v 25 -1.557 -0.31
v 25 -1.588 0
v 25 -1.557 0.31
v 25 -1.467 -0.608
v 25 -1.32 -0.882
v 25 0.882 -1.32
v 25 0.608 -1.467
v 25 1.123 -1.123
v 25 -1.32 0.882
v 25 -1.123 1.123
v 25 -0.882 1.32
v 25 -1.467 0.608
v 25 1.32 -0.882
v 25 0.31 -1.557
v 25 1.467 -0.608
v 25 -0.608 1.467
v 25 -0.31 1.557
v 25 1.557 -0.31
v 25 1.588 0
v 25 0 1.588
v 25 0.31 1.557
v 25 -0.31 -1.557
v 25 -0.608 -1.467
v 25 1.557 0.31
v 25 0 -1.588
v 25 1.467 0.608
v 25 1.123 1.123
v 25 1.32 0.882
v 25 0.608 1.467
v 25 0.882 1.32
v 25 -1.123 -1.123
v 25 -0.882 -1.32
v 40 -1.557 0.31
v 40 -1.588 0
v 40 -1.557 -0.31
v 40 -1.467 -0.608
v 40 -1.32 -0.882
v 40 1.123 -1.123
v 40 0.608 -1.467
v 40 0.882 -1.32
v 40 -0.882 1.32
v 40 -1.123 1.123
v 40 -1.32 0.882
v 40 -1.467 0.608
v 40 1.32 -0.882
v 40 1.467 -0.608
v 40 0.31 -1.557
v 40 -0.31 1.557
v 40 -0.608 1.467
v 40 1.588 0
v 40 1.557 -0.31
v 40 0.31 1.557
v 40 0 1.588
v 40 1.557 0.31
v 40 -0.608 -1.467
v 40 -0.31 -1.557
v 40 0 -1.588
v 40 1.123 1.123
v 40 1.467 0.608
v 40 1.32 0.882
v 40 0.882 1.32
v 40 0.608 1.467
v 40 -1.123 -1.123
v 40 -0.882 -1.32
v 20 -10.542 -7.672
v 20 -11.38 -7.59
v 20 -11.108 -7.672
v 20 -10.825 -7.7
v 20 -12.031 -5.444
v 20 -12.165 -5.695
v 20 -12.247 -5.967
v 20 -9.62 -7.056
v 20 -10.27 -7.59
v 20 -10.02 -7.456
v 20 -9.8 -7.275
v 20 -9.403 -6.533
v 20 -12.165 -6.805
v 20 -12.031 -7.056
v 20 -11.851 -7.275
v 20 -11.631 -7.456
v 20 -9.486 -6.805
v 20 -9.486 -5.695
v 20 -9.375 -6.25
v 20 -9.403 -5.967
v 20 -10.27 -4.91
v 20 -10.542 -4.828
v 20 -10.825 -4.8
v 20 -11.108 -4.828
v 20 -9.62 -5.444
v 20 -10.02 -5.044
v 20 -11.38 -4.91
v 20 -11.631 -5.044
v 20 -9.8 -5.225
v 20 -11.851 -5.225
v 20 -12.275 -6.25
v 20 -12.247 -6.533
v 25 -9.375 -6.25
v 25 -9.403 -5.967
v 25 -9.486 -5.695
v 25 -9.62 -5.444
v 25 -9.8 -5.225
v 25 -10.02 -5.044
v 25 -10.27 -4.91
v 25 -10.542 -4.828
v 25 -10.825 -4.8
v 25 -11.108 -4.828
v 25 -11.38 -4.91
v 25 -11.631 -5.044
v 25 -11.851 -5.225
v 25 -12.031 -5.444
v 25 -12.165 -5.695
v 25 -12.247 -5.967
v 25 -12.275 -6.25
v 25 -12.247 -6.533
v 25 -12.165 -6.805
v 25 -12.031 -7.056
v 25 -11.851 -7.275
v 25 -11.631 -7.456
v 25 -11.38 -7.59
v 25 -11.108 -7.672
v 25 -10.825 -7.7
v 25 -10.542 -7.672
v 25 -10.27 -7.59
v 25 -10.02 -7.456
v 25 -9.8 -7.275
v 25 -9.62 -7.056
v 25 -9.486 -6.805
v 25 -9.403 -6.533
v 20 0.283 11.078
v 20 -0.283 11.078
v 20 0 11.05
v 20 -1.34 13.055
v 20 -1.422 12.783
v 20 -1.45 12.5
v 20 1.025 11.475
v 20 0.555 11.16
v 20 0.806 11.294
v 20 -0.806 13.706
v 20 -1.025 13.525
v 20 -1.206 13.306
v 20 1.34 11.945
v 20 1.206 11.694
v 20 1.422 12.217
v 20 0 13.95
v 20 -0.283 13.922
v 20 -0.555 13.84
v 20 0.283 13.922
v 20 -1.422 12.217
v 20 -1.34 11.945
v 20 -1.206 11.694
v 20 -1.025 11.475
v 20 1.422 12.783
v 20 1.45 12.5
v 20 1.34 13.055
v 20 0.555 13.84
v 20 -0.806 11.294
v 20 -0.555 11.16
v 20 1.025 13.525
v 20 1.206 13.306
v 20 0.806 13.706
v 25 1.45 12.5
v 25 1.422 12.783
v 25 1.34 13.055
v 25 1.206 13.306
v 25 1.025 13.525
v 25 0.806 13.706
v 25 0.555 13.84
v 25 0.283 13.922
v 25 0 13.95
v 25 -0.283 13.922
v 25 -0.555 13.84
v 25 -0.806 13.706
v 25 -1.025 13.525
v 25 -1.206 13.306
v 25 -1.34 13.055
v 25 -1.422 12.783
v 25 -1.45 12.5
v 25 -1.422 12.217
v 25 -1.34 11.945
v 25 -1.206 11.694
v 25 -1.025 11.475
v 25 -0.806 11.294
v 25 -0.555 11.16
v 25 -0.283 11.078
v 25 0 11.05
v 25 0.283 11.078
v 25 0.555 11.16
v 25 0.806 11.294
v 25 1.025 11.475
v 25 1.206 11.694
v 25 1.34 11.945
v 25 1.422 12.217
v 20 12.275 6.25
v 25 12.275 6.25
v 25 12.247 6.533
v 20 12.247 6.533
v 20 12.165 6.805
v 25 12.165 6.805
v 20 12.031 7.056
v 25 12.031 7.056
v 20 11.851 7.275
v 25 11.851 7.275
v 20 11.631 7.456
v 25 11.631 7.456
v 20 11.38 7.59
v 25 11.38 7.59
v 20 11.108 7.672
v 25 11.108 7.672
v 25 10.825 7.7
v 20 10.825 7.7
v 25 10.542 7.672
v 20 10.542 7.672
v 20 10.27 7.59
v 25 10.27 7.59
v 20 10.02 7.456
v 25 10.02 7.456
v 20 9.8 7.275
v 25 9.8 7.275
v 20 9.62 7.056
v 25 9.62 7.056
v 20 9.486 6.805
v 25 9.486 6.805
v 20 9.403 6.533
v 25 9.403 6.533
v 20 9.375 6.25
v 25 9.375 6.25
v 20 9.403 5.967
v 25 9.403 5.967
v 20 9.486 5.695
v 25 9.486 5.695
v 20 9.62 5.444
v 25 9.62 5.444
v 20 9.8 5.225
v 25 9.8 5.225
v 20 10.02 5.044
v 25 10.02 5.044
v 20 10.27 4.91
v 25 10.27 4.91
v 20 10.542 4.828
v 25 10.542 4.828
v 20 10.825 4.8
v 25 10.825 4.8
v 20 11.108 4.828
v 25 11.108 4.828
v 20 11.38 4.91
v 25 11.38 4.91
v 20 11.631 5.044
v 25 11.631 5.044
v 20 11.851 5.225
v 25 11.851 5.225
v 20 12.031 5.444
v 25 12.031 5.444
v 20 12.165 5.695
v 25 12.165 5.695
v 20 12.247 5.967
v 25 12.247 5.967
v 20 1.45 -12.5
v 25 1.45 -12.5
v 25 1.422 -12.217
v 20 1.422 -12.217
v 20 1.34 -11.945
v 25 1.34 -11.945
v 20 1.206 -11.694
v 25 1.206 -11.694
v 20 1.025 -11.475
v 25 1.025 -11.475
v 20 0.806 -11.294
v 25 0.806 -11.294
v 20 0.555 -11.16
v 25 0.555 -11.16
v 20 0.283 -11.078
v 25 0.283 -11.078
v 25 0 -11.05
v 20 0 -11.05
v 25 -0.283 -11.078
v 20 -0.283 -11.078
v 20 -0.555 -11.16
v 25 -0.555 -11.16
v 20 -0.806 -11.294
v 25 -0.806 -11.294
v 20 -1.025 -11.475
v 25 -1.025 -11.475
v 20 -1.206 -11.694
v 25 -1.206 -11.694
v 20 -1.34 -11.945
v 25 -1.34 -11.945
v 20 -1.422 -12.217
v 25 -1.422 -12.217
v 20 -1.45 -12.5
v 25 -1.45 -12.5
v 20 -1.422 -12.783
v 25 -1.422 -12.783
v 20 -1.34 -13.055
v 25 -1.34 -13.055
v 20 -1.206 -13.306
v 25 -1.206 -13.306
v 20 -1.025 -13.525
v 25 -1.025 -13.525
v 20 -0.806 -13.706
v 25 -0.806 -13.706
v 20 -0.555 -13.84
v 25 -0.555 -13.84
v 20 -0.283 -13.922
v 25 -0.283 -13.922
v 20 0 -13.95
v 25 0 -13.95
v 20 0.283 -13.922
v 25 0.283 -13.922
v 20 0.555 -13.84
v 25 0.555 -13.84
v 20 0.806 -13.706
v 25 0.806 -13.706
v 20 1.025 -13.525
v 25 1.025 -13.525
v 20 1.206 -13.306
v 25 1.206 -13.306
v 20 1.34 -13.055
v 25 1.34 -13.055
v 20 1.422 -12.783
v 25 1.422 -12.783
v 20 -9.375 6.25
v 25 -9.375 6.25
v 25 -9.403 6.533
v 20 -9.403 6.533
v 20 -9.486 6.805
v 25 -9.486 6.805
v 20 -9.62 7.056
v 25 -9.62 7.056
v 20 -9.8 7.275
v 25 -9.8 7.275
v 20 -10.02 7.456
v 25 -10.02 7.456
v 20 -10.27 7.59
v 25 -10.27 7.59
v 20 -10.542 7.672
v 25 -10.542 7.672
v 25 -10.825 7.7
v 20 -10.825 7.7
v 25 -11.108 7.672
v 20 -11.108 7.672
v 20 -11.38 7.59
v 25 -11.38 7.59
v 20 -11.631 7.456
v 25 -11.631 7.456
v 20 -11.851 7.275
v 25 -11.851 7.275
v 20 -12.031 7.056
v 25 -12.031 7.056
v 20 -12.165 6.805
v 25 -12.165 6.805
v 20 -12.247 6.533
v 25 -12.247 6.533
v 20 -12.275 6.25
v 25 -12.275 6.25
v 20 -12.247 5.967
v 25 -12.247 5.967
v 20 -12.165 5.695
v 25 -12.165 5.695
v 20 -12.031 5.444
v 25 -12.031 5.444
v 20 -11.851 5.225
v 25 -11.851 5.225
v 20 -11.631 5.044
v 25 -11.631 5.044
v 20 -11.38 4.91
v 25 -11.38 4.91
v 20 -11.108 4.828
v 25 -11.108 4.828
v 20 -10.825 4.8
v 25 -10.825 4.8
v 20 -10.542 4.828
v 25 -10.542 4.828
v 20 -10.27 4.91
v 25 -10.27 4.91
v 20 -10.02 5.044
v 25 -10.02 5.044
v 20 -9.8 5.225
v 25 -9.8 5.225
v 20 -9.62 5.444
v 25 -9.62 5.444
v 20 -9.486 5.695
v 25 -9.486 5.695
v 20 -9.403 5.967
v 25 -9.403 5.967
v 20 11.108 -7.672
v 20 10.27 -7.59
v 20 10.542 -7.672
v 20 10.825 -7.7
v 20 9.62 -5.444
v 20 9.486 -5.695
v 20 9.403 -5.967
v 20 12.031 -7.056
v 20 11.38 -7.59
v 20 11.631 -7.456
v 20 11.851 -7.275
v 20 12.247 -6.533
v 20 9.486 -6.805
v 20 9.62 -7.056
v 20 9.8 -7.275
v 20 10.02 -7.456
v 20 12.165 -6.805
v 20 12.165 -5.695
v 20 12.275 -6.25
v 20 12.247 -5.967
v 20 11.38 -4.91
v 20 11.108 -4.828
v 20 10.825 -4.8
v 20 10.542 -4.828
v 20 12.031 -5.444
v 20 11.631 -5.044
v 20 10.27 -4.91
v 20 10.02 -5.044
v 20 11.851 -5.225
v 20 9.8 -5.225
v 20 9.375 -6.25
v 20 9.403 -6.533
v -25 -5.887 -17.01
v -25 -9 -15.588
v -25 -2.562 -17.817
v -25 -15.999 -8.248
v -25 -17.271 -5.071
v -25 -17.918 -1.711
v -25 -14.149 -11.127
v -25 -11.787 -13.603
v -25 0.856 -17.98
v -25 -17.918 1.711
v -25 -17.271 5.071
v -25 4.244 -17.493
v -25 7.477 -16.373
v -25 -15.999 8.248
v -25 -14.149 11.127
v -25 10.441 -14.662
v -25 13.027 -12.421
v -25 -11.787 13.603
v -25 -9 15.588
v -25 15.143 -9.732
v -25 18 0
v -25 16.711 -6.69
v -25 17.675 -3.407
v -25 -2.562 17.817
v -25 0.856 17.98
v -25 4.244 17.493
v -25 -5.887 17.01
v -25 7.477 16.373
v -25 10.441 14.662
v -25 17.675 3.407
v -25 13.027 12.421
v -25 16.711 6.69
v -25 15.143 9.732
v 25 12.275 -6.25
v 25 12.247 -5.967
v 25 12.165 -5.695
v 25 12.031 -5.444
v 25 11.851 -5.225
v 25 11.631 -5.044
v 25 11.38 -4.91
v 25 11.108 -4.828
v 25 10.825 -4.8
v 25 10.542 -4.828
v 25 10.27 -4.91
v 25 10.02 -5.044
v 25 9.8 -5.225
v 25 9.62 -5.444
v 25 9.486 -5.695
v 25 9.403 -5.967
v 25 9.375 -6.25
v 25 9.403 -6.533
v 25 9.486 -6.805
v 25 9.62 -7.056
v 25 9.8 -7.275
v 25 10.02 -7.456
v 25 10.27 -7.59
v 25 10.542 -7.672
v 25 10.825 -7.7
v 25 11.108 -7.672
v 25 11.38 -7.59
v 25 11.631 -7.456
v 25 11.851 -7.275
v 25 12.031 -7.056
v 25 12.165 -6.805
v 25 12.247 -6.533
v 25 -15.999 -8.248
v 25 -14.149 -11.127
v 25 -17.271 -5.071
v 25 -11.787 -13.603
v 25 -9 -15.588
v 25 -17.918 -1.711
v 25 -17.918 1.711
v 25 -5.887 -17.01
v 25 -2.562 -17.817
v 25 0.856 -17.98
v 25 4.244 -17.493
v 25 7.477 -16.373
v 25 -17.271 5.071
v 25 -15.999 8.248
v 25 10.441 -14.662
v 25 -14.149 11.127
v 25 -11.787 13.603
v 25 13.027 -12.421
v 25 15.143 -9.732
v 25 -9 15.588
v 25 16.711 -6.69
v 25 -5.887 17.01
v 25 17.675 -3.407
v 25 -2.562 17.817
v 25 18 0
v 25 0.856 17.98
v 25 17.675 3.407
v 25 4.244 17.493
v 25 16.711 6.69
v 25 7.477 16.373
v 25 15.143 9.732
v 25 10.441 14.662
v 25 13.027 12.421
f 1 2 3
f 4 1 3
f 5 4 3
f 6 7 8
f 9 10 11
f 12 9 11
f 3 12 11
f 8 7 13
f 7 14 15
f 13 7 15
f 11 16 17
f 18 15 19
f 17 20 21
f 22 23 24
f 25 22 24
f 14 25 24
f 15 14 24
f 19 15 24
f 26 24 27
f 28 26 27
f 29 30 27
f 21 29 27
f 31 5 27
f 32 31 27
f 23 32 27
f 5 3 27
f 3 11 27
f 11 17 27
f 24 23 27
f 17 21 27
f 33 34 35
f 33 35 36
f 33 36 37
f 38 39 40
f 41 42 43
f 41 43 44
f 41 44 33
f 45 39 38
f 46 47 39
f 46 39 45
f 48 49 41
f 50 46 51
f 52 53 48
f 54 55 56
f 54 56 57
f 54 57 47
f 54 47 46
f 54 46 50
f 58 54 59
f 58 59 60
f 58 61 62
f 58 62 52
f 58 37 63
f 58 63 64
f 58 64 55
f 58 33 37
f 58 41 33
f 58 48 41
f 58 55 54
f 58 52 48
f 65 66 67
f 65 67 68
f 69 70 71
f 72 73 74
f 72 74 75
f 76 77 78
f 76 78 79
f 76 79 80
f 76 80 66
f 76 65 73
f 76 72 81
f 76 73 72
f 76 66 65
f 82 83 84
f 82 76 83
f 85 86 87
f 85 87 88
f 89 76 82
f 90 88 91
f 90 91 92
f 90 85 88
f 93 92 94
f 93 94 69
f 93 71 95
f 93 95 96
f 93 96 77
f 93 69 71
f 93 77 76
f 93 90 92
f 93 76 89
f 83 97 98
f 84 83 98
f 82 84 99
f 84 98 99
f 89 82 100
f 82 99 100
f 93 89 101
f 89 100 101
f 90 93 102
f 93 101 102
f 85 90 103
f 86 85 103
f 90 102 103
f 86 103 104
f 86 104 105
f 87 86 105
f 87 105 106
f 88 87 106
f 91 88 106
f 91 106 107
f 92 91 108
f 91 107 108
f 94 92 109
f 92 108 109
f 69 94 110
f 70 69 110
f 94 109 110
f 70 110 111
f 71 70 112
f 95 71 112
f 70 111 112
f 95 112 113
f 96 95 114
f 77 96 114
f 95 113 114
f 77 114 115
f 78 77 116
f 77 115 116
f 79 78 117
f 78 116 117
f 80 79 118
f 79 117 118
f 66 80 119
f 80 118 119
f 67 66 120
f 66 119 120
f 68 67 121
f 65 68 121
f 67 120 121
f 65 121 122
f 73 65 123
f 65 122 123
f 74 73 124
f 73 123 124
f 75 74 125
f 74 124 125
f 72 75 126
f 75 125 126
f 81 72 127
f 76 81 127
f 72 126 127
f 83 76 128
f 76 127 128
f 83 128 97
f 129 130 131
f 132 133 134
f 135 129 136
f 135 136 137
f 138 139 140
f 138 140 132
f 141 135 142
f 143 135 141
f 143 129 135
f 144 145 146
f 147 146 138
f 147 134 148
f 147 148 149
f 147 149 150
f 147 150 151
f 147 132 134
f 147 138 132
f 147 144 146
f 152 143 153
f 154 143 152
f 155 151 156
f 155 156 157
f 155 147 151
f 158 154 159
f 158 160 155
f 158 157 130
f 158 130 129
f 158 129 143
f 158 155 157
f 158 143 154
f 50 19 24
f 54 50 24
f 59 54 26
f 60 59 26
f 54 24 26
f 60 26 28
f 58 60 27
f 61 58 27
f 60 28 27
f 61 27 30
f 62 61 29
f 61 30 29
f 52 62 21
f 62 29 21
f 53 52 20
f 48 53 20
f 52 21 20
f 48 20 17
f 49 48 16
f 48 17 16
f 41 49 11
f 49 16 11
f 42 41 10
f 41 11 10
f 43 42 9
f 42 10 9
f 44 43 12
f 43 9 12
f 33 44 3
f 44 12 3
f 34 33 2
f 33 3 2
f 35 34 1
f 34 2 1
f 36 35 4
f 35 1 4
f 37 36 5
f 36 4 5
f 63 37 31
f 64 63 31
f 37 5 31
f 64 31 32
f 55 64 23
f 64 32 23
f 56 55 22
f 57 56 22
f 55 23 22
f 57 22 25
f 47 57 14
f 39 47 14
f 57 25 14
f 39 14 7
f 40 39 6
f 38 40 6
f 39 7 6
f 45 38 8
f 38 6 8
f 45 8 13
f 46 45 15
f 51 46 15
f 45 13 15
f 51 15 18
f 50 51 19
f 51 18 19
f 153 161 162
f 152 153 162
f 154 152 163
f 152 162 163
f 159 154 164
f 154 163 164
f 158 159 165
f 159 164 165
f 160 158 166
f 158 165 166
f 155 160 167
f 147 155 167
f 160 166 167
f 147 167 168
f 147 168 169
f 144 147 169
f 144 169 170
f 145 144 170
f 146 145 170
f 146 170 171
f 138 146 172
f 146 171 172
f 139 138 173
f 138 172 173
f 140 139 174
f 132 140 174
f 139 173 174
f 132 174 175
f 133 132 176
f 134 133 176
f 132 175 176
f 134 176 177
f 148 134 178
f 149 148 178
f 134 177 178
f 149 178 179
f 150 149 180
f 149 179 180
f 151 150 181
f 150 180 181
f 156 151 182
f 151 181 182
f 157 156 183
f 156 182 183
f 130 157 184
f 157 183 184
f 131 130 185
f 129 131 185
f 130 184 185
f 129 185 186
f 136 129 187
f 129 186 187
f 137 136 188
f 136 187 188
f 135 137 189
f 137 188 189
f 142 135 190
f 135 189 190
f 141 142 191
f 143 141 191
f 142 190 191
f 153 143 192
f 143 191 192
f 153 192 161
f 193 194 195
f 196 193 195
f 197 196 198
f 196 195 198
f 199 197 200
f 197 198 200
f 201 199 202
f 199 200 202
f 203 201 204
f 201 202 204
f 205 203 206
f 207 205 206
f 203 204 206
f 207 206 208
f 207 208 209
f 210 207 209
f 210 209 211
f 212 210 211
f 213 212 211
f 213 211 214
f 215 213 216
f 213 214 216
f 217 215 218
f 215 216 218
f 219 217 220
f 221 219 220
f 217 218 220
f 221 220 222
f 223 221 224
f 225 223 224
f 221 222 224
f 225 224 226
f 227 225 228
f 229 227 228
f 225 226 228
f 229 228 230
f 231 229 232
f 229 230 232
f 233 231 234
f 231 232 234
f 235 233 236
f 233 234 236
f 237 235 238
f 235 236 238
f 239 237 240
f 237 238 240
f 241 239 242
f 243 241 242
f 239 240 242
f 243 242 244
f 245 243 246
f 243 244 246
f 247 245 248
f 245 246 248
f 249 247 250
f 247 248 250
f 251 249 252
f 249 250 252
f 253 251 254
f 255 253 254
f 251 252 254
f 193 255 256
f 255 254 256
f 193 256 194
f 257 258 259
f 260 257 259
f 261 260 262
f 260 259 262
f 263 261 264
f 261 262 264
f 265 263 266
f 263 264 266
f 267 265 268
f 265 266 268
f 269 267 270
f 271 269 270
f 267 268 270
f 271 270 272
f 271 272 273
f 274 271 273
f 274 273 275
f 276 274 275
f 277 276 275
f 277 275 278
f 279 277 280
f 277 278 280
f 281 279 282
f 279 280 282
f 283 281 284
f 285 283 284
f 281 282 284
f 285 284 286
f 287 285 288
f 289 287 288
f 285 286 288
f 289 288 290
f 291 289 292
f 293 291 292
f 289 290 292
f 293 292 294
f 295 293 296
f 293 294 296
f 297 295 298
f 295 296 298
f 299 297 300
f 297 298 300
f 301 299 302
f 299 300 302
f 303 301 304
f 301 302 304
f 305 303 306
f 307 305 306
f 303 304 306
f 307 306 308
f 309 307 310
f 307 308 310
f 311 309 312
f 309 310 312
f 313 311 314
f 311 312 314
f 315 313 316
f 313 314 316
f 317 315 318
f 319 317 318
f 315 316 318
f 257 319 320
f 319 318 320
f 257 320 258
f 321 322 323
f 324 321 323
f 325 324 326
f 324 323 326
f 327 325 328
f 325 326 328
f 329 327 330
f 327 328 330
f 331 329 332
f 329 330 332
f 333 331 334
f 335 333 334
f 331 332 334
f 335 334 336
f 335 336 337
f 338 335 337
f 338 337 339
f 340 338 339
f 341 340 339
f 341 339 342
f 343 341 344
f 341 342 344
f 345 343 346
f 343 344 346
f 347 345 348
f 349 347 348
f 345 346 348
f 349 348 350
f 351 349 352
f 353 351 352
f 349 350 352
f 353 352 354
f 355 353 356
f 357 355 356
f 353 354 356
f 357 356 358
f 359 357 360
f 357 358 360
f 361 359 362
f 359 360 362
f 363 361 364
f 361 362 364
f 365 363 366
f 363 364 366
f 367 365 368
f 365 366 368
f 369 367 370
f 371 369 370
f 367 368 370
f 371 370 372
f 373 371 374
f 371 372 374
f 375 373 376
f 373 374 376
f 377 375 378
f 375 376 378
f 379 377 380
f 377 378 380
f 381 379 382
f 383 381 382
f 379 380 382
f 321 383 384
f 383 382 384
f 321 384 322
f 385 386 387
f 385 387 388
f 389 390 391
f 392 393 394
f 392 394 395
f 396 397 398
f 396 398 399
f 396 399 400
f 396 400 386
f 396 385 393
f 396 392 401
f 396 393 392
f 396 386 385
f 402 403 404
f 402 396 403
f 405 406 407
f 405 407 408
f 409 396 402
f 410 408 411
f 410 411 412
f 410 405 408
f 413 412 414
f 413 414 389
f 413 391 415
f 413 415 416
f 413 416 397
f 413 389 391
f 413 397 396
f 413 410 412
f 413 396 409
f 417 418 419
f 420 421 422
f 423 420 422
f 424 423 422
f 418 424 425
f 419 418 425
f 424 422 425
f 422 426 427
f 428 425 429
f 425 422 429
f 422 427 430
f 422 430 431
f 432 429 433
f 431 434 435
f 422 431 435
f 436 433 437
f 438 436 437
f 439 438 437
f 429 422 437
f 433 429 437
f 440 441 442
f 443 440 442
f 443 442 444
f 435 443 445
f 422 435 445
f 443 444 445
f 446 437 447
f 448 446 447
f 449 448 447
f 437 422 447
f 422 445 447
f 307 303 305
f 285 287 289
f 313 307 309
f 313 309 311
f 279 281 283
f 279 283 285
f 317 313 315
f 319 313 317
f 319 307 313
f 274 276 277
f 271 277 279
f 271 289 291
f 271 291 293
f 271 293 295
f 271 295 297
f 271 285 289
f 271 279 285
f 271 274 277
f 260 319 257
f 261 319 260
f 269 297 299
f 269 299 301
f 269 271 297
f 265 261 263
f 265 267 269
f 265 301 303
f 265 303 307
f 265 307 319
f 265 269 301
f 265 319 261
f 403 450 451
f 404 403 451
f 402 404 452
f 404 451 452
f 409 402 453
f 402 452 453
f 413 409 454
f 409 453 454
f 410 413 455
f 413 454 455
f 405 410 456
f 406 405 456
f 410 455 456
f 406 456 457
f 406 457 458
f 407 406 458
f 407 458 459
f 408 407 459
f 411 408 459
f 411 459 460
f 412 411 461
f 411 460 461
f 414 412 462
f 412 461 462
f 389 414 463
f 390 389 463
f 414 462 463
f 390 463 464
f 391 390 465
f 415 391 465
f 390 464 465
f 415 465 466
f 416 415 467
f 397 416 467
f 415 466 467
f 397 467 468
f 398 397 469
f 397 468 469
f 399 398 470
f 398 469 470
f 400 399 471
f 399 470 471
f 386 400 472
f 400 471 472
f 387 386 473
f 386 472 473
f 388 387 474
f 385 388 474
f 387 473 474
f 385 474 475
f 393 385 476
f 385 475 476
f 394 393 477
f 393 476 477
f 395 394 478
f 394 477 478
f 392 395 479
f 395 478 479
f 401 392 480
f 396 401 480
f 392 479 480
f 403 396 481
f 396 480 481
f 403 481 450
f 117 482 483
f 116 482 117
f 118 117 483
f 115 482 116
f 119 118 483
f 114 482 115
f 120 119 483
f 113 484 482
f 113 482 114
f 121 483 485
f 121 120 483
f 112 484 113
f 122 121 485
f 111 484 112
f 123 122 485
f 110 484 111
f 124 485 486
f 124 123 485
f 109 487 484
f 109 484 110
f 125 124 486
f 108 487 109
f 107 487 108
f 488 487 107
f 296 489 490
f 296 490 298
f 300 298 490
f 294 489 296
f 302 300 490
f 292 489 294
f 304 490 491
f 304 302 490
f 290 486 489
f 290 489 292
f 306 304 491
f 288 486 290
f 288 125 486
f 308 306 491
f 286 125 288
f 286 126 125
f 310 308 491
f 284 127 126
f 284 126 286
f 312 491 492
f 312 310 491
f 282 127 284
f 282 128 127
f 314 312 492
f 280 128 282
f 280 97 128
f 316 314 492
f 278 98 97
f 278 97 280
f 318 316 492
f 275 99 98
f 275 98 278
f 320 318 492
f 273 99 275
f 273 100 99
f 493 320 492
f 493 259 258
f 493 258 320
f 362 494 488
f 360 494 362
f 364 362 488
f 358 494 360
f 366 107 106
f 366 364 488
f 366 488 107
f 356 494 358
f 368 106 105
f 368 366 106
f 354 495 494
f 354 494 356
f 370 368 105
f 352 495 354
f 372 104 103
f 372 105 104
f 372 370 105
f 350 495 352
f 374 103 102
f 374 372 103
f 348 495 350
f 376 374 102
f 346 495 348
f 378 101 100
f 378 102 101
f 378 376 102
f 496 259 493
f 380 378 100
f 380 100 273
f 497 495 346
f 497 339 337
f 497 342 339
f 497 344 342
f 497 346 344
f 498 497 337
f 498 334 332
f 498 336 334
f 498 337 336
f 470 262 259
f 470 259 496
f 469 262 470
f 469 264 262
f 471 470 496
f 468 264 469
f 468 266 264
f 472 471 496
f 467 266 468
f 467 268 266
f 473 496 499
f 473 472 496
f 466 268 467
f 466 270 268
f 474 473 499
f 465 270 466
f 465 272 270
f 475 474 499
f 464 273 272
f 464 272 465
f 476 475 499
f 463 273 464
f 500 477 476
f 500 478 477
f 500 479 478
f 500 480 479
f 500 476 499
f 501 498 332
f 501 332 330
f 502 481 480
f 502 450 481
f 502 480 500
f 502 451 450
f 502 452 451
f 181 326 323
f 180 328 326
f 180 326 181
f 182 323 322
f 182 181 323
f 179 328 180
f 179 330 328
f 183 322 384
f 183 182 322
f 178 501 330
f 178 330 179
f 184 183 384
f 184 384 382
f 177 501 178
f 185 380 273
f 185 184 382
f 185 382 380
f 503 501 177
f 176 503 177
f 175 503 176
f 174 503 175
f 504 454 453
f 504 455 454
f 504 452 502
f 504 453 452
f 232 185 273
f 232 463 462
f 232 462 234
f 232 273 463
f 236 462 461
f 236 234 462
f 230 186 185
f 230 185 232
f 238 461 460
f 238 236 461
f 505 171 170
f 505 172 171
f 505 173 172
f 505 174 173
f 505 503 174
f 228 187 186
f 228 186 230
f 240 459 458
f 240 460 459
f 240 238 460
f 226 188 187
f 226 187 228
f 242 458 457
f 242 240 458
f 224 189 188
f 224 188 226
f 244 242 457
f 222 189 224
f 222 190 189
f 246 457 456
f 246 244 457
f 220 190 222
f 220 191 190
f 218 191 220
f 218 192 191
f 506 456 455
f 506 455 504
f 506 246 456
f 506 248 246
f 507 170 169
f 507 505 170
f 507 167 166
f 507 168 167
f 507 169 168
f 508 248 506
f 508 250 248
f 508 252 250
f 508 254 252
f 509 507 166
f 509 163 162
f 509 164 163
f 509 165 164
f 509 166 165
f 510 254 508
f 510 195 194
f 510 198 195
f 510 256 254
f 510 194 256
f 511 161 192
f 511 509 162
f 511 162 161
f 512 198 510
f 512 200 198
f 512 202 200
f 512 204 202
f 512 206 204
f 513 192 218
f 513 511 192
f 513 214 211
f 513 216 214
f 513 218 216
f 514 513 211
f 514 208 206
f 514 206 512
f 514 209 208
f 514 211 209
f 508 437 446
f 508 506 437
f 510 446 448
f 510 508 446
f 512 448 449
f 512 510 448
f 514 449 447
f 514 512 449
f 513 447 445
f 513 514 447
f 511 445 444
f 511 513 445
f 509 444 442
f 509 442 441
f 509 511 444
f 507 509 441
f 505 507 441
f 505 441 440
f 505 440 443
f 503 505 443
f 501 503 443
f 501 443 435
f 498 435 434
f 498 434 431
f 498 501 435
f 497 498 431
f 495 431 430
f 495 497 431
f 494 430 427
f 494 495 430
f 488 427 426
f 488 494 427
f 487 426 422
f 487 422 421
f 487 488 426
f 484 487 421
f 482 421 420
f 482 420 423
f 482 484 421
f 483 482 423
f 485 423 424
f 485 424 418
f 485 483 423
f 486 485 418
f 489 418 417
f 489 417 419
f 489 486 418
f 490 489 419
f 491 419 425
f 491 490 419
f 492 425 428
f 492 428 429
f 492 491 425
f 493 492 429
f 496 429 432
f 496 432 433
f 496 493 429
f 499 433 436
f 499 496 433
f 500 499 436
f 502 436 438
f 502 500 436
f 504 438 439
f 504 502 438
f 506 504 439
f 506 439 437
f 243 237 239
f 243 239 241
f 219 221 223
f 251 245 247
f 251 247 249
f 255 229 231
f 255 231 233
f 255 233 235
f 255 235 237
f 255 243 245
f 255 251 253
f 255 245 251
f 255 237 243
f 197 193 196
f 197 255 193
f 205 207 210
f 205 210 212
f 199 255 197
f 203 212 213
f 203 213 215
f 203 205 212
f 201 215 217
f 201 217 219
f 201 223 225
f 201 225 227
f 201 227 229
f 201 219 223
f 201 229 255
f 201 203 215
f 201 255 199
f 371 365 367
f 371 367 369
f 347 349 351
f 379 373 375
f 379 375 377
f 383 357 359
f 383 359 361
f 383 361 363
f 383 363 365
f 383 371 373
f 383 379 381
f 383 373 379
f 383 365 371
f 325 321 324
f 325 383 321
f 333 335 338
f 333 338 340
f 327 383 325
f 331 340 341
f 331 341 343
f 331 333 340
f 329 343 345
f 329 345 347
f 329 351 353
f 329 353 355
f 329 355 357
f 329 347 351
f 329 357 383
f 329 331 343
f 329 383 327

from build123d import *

# Parameters (mm, degrees)
F0_R     = 18
F1_DEPTH = 25
F2_R     = 1.5875
F3_DEPTH = 15
F4_R     = 1.45
F5_DEPTH = 5


with BuildPart() as f1:
    # F0 (on Right) → F1 (new body, symmetric)
    with BuildSketch(Plane.YZ):
        Circle(F0_R)
    extrude(amount=F1_DEPTH, both=True)

    # F4 (on face) → F5 (cut)
    with BuildSketch(Plane.YZ.offset(25)):
        with Locations((-10.8253175473, 6.25)):
            Circle(F4_R)
        with Locations((0, 12.5)):
            Circle(F4_R)
        with Locations((10.8253175473, 6.25)):
            Circle(F4_R)
        with Locations((10.8253175473, -6.25)):
            Circle(F4_R)
        with Locations((0, -12.5)):
            Circle(F4_R)
        with Locations((-10.8253175473, -6.25)):
            Circle(F4_R)
    extrude(amount=-F5_DEPTH, mode=Mode.SUBTRACT)


with BuildPart() as f3:
    # F2 (on face) → F3 (new body)
    with BuildSketch(Plane.YZ.offset(25)):
        Circle(F2_R)
    extrude(amount=F3_DEPTH)


solid = Compound([f1.part, f3.part])
